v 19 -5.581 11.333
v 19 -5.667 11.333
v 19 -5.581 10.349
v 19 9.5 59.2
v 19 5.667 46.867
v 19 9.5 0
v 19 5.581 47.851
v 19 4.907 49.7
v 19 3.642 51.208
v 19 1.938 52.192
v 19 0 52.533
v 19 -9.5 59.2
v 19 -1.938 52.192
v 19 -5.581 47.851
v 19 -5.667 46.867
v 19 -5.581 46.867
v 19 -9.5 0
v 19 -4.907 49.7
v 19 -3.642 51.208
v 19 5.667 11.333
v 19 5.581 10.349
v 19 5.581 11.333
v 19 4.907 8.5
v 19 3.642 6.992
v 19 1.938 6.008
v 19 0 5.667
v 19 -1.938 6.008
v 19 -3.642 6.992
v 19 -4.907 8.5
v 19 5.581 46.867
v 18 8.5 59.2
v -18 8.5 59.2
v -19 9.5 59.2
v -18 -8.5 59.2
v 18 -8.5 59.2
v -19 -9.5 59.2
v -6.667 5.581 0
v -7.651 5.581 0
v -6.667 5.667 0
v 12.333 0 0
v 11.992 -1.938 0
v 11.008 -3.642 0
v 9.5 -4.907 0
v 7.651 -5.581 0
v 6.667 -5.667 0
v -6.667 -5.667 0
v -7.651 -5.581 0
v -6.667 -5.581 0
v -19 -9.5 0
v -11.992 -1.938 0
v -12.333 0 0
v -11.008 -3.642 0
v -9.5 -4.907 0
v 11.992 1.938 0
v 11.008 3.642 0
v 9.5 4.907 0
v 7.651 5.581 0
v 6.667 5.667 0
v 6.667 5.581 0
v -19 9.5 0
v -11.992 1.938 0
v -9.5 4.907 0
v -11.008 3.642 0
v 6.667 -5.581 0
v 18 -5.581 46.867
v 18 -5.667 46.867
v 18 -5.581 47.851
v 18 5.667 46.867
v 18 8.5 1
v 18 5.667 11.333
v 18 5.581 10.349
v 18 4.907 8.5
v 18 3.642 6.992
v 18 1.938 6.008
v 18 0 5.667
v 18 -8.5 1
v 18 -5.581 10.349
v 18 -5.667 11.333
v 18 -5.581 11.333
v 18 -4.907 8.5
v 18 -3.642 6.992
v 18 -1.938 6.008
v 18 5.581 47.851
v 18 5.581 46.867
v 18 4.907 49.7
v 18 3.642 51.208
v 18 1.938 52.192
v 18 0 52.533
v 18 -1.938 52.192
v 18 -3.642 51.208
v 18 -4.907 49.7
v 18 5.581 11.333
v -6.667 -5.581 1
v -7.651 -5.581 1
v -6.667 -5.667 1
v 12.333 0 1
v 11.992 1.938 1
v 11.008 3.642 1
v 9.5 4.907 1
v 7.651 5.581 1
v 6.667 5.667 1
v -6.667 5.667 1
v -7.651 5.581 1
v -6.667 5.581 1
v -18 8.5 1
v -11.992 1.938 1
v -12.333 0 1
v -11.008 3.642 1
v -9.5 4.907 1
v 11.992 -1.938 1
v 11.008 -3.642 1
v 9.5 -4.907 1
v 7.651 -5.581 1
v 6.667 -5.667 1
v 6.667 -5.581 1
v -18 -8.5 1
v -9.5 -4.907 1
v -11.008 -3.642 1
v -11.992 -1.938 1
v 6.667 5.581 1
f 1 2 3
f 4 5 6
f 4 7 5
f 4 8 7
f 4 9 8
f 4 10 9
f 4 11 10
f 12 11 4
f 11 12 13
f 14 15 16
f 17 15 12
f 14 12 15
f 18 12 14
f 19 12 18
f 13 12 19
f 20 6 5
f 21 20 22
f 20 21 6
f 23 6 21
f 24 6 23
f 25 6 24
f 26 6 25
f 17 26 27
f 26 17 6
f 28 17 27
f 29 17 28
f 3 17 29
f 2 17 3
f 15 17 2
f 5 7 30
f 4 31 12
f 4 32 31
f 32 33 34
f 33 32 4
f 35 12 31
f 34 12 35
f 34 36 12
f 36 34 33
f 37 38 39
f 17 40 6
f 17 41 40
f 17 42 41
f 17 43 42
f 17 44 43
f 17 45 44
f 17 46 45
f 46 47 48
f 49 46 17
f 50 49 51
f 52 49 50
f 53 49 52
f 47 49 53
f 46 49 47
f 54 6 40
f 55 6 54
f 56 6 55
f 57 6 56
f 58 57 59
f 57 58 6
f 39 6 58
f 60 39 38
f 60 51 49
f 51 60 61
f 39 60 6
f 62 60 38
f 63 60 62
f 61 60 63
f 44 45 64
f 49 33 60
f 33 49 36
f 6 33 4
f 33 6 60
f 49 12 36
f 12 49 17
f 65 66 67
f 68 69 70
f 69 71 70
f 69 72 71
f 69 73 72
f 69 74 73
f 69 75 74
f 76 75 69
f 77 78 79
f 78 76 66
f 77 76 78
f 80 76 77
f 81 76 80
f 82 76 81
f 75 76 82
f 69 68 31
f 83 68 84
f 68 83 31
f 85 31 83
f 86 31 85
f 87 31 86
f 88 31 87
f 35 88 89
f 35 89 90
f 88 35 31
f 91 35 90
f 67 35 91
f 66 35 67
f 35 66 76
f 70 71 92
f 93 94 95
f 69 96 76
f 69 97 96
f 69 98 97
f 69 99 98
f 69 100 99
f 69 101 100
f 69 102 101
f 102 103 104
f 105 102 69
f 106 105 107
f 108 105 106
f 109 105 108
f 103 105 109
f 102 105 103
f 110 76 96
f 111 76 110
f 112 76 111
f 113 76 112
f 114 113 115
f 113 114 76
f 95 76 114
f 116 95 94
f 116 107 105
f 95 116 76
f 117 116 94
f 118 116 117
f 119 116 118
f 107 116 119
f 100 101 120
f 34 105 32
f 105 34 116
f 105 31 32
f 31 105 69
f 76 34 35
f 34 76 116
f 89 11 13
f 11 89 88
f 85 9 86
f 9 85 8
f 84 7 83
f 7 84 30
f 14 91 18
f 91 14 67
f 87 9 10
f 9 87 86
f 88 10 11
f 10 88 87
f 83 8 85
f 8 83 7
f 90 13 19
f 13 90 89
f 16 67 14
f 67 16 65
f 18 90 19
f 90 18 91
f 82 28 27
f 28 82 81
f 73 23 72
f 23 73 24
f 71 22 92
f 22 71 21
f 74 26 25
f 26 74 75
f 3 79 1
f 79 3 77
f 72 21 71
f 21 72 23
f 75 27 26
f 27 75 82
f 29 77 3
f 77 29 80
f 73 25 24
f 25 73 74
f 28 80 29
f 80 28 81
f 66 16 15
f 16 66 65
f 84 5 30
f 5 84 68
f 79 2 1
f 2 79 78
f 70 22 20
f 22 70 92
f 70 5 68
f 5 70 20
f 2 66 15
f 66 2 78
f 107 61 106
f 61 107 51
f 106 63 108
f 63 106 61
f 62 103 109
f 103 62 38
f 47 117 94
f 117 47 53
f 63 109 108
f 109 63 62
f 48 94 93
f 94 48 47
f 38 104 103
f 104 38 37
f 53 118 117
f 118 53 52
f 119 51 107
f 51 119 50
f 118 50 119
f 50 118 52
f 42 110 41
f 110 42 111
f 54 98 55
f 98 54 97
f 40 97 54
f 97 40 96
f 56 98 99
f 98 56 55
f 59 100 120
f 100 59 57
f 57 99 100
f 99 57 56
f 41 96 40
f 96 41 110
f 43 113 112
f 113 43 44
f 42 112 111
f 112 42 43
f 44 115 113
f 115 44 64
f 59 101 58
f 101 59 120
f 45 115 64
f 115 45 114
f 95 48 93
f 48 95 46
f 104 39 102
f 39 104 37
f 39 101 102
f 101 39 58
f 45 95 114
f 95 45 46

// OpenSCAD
//match case
width=36;
thickness=17;
height=58.2;
shell=1;
slot=thickness/1.5;

difference(){
//outside box
translate([-(width+shell*2)/2,-(thickness+shell*2)/2,0]){
    cube([width+shell*2, thickness+shell*2, height+shell]);
    }
//inside box
translate([-width/2,-thickness/2,shell]){
    cube([width, thickness, height+shell*2]);
    }

//slot in the side to light the match
//circle1
    translate([width/2.2,0,height-slot]){
rotate(a = 90, v=[0, 1, 0]) cylinder(r=slot/2, h=shell*4);
}
//circle2
translate([width/2.2,0,slot]){
rotate(a = 90, v=[0, 1, 0]) cylinder(r=slot/2, h=shell*4);
}
//square
translate([width/2.2,-slot/2,slot]){
    cube([shell*4, slot, (height-slot*2)]);
}
//slot in the bottom to open
//circle1
    translate([-width*0.5+slot,0,-shell*2]){
cylinder(r=slot/2, h=shell*4);
}
//circle2
translate([width*0.5-slot,0,-shell*2]){
cylinder(r=slot/2, h=shell*4);
}
//square
translate([-width*0.5+slot,-slot/2,-shell*2]){
    cube([width-slot*2, slot, shell*4]);
}


}
